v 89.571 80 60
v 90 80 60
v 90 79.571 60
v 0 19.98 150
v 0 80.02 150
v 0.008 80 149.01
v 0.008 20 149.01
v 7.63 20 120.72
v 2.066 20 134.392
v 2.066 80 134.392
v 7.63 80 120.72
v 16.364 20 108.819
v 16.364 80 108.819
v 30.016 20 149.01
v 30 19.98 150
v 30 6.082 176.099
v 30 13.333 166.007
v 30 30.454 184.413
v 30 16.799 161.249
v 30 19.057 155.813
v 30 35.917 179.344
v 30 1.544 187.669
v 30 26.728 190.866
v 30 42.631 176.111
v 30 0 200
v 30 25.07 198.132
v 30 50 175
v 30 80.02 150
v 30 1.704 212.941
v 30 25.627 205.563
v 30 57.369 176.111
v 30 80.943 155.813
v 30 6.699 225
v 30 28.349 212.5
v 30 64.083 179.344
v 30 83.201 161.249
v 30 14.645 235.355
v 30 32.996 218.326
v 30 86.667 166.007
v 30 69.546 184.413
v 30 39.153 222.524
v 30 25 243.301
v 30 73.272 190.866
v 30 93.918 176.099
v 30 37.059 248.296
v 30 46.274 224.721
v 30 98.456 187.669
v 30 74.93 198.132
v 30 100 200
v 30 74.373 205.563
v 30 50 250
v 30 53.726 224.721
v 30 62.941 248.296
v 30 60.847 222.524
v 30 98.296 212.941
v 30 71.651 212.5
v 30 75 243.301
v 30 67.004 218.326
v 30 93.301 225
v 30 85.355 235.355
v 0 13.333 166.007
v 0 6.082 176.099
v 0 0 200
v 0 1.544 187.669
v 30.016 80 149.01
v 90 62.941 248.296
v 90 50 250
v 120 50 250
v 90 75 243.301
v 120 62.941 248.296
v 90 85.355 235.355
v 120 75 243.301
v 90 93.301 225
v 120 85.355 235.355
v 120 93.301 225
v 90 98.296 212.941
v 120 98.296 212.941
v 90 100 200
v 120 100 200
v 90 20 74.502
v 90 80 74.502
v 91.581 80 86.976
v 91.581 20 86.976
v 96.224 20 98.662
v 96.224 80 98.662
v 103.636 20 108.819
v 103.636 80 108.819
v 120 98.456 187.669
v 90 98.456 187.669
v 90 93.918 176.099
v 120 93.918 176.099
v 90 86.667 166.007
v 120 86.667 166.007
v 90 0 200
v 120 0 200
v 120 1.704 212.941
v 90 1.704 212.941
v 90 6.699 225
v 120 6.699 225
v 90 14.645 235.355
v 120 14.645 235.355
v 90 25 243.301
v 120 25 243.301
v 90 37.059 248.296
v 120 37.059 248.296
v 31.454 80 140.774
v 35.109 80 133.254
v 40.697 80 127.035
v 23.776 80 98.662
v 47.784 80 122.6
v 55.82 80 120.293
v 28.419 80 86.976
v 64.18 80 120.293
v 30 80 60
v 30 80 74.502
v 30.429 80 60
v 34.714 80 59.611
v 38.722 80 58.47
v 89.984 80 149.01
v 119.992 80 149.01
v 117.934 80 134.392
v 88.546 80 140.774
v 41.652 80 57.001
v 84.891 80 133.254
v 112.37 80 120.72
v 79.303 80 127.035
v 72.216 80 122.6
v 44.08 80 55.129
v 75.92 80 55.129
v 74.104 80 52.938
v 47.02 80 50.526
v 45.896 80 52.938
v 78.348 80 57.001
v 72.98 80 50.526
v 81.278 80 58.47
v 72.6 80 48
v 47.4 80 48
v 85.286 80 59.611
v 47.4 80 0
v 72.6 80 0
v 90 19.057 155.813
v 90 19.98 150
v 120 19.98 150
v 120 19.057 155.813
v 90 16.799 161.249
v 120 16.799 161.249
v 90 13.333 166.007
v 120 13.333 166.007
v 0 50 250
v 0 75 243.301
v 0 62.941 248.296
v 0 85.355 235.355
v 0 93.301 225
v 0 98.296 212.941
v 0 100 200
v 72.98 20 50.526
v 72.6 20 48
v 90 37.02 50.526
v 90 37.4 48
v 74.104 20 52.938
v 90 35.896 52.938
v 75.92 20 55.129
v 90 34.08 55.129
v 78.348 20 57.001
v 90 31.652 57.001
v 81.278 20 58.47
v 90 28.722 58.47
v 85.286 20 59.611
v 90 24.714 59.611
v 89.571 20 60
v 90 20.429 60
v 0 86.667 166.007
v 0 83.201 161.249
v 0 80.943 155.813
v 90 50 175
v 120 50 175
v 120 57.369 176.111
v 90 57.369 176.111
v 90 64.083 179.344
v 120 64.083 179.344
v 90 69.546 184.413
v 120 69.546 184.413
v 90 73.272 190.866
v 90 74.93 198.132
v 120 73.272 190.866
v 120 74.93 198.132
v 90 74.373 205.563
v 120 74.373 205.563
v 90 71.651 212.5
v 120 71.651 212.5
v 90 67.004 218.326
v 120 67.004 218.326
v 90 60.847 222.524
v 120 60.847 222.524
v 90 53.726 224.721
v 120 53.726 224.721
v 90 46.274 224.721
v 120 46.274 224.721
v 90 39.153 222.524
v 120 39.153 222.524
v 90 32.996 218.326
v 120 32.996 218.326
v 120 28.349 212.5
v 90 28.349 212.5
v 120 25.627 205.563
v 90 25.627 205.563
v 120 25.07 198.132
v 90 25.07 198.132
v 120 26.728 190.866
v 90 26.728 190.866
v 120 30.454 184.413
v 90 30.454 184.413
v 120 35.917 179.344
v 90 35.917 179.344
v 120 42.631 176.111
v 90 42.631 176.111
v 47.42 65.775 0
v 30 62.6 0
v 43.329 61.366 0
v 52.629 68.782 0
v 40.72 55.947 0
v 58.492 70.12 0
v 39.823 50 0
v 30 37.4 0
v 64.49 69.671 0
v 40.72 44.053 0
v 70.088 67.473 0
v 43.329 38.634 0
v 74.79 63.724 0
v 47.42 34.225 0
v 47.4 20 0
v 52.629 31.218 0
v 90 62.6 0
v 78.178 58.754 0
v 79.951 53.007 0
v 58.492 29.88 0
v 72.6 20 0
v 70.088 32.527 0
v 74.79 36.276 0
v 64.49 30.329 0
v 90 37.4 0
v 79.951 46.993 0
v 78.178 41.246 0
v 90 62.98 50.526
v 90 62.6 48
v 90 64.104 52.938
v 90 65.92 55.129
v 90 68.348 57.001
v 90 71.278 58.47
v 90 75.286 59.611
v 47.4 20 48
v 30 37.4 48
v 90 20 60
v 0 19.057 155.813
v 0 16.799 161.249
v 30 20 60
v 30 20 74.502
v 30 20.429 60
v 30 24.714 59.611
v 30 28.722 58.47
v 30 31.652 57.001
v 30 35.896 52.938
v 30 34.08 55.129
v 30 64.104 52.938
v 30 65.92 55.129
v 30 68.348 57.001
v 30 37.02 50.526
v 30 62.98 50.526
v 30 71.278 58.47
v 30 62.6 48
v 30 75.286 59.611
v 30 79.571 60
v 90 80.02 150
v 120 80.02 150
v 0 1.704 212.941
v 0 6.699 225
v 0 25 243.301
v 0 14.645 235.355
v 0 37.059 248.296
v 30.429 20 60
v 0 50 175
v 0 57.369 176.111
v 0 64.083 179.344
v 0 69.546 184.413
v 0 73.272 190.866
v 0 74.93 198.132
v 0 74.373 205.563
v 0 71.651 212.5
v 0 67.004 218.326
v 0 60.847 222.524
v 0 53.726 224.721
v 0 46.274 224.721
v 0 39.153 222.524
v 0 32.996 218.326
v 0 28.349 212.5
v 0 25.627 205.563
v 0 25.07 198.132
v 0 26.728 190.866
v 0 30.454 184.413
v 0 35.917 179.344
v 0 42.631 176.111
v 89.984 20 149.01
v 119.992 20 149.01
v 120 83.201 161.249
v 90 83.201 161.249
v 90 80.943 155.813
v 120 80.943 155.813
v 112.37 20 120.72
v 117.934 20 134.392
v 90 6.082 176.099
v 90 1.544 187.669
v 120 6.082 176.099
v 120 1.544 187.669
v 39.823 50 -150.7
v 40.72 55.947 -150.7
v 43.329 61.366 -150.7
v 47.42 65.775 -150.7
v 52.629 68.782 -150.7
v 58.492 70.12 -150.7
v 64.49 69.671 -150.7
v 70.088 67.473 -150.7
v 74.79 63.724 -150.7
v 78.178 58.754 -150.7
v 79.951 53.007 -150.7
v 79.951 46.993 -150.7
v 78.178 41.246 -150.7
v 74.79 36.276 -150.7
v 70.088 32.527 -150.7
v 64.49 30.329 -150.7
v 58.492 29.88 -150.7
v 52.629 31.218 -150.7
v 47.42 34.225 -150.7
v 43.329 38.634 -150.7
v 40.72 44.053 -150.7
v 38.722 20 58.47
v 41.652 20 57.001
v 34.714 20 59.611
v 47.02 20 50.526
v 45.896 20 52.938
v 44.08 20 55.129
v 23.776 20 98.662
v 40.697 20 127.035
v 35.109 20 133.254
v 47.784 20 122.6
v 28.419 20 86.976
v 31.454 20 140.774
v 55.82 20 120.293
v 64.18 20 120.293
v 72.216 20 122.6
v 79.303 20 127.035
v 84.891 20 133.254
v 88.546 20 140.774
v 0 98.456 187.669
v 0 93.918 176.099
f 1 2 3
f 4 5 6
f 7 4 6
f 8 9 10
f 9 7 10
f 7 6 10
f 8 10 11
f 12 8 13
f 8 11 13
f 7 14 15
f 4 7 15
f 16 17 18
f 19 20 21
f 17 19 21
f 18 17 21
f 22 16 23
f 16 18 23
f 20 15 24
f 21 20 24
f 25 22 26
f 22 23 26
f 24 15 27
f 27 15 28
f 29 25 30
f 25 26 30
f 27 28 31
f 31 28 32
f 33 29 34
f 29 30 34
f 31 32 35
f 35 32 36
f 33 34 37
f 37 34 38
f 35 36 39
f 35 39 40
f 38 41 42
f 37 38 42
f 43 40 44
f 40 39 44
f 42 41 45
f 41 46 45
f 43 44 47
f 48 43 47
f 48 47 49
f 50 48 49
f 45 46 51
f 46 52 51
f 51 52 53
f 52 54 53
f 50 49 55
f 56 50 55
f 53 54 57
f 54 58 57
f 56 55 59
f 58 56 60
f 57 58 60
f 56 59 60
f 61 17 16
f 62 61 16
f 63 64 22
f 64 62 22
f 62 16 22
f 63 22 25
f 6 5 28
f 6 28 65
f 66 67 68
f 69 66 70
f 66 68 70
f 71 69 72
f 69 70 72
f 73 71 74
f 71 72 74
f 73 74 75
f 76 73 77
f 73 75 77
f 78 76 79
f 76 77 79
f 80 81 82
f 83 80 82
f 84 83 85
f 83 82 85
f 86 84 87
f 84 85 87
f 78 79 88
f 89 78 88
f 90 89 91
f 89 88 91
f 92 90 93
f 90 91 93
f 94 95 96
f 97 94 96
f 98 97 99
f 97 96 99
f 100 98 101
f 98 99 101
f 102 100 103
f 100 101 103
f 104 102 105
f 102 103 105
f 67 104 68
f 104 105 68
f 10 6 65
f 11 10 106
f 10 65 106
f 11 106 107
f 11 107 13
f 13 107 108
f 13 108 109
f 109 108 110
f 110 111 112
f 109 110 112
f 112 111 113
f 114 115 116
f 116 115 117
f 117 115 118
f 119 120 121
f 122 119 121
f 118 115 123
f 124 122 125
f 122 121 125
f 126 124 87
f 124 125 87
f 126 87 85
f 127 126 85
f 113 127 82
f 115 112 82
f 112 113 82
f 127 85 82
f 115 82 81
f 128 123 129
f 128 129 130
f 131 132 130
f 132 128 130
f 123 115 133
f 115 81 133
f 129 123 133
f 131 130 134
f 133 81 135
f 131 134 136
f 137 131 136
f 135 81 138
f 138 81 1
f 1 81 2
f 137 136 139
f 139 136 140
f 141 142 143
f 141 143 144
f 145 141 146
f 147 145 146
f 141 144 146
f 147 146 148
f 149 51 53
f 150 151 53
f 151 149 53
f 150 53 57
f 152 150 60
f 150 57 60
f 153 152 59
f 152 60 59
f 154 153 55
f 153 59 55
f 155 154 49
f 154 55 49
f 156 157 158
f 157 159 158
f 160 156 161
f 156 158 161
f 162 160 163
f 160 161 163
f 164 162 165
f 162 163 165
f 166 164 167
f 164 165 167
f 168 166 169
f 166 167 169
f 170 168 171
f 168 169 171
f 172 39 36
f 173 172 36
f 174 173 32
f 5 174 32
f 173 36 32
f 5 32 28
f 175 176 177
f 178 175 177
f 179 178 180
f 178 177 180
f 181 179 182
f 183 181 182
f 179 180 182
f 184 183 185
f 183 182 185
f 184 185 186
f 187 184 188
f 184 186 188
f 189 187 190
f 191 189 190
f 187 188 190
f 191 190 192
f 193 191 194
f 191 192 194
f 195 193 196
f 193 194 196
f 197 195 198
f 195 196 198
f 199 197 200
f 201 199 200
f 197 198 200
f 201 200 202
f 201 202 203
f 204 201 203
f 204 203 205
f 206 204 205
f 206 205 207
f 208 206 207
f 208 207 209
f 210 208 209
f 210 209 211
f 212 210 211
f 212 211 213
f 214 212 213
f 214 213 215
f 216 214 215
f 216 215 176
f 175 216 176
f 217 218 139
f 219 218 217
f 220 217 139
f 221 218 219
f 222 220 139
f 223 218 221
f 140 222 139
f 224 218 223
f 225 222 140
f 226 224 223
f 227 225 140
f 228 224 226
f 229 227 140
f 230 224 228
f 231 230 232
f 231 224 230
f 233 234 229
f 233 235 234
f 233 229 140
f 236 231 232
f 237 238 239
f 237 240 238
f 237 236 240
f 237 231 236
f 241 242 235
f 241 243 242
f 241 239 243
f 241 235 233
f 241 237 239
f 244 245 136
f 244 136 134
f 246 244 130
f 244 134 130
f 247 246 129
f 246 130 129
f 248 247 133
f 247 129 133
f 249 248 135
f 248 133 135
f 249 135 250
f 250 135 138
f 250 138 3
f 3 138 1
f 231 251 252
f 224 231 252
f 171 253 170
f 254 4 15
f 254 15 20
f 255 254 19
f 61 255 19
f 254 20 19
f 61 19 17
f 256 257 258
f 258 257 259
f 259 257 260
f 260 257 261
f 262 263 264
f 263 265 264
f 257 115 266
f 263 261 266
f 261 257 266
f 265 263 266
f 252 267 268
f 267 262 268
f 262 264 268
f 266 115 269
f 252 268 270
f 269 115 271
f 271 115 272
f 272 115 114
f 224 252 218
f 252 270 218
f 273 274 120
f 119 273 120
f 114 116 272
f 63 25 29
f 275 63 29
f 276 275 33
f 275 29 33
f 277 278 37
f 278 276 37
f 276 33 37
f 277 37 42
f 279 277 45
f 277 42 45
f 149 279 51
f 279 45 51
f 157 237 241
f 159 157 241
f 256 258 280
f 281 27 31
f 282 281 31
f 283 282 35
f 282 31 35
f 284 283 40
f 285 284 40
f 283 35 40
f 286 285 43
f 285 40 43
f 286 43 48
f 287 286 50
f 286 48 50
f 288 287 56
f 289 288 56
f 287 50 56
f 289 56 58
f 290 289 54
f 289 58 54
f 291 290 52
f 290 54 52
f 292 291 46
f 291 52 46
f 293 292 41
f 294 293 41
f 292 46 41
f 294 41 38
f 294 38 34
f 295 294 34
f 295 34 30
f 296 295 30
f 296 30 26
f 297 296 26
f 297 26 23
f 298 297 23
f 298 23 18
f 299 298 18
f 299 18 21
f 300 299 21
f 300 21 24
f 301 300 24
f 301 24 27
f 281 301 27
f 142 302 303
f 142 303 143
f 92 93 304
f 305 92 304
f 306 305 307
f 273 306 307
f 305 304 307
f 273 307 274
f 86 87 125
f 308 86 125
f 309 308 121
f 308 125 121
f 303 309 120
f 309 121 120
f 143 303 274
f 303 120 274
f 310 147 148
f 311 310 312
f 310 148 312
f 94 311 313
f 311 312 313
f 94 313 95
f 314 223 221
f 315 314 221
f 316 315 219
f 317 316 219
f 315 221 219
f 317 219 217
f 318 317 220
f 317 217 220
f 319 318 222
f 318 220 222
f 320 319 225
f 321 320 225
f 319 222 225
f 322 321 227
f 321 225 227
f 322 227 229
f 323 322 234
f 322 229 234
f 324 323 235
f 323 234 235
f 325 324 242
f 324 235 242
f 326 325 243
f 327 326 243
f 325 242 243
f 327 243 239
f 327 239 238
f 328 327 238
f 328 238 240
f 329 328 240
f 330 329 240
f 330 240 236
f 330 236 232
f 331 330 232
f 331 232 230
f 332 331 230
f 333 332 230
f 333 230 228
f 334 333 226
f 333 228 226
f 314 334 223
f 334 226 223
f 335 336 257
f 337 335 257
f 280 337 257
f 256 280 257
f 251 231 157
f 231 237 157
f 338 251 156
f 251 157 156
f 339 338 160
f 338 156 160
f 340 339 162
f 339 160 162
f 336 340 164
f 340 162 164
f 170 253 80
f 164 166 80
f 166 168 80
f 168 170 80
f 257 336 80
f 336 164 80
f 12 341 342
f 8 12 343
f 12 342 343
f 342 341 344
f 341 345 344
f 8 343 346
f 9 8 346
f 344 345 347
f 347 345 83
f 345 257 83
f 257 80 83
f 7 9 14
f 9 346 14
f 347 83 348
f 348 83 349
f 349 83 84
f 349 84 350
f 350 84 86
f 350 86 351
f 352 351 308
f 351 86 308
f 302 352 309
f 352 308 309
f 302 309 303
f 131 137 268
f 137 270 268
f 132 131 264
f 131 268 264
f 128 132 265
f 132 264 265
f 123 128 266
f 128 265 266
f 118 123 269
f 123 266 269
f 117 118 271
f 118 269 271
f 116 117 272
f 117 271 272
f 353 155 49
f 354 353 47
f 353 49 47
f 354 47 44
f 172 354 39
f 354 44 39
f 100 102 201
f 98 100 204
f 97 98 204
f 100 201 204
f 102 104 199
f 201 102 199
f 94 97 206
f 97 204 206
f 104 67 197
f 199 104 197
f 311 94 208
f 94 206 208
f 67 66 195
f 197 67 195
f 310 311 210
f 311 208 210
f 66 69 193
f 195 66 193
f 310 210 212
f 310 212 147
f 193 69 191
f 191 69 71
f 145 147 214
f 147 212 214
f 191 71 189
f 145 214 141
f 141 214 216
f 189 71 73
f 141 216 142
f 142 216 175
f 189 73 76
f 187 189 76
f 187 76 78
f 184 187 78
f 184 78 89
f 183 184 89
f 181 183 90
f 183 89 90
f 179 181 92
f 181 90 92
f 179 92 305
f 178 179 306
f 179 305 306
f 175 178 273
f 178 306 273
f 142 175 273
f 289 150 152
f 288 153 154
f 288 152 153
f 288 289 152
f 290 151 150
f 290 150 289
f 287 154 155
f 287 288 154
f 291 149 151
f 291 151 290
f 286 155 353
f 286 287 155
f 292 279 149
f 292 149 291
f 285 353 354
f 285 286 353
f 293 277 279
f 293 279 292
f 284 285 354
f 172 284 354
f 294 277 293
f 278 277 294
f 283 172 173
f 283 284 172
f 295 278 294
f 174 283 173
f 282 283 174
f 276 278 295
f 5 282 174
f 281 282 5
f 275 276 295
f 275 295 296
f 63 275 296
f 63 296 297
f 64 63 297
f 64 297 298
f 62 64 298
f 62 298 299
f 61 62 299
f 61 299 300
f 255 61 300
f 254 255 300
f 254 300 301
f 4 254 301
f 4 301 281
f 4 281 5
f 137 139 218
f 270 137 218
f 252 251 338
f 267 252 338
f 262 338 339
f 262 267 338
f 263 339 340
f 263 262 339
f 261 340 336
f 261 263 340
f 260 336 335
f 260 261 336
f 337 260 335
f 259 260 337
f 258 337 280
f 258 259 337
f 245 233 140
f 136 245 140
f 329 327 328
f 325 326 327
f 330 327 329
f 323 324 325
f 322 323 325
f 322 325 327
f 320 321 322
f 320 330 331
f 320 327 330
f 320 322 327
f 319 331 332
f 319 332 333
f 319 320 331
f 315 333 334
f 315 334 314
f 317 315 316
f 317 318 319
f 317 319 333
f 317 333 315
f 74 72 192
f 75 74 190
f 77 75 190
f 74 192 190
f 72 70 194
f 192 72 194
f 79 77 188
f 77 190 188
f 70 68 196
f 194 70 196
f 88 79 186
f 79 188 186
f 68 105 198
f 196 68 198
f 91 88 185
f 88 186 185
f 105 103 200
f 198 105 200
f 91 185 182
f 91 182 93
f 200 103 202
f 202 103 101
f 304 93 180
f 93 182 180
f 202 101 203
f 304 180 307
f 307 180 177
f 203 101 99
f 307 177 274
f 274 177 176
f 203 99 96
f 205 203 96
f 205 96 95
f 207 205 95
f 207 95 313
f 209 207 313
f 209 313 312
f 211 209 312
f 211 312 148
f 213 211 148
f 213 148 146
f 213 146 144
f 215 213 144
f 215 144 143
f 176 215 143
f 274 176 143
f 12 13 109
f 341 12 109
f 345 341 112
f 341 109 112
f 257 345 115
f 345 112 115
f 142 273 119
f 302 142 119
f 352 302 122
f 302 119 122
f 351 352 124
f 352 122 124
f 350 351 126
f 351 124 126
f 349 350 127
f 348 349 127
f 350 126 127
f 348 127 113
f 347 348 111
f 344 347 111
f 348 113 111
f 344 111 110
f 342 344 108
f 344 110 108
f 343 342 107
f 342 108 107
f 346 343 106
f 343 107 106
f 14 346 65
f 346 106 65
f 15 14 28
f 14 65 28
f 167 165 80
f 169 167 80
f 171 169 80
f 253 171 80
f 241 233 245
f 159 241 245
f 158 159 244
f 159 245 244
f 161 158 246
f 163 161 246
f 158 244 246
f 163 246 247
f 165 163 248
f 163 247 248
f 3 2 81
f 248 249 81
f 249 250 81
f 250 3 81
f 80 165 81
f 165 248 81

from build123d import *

# Parameters (mm, degrees)
SKETCH1_W           = 120
SKETCH1_H           = 250
BOSS_EXTRUDE1_DEPTH = 100
CUT_EXTRUDE1_DEPTH  = 295.78805946
CUT_EXTRUDE2_DEPTH  = 295.78805946
SKETCH5_R           = 25
CUT_EXTRUDE3_DEPTH  = 295.7880595
CUT_EXTRUDE5_DEPTH  = 60
CUT_EXTRUDE6_DEPTH  = 60
CUT_EXTRUDE7_DEPTH  = 60
CUT_EXTRUDE8_DEPTH  = 60
SKETCH10_R          = 20.176522507
BOSS_EXTRUDE2_DEPTH = 150.7
FILLET1_R           = 12
FILLET2_R           = 12
FILLET3_R           = 12
FILLET4_R           = 12


with BuildPart() as part:
    # Sketch1 → Boss-Extrude1 (new body)
    with BuildSketch(Plane(origin=(0, 0, 0), x_dir=(1, 0, 0), z_dir=(0, 1, 0))):
        with Locations((60, -125)):
            Rectangle(SKETCH1_W, SKETCH1_H)
    extrude(amount=BOSS_EXTRUDE1_DEPTH)

    # Sketch2 → Cut-Extrude1 (cut, through all)
    with BuildSketch(Plane(origin=(0, 100, 0), x_dir=(1, 0, 0), z_dir=(0, 1, 0))):
        with BuildLine():
            ThreePointArc((90, -150), (60, -120), (30, -150))
            Line((30, -150), (30, -250))
            Line((30, -250), (90, -250))
            Line((90, -250), (90, -150))
        make_face()
        with BuildLine():
            Line((120, 0), (90, 0))
            Line((90, 0), (90, -74.501655647))
            ThreePointArc((90, -74.501655647), (93.533981136, -92.965379294), (103.636363636, -108.819084899))
            ThreePointArc((103.636363636, -108.819084899), (115.759222637, -127.843531624), (120, -150))
            Line((120, -150), (120, 0))
        make_face()
        with BuildLine():
            Line((30, -74.501655647), (30, 0))
            Line((30, 0), (0, 0))
            Line((0, 0), (0, -150.000000078))
            ThreePointArc((0, -150.000000078), (4.240777349, -127.84353166), (16.363636364, -108.819084899))
            ThreePointArc((16.363636364, -108.819084899), (26.466018864, -92.965379294), (30, -74.501655647))
        make_face()
    extrude(amount=-CUT_EXTRUDE1_DEPTH, mode=Mode.SUBTRACT)

    # Sketch4 → Cut-Extrude2 (cut, through all)
    with BuildSketch(Plane(origin=(120, 0, 0), x_dir=(0, 0, -1), z_dir=(1, 0, 0))):
        with BuildLine():
            ThreePointArc((-250, 50), (-235.355339059, 85.355339059), (-200, 100))
            Line((-200, 100), (-250, 100))
            Line((-250, 100), (-250, 50))
        make_face()
        with BuildLine():
            Line((-150, 100), (-200, 100))
            ThreePointArc((-200, 100), (-181.742581416, 96.547466813), (-166.006536576, 86.666666667))
            ThreePointArc((-166.006536576, 86.666666667), (-158.59772436, 81.911652295), (-150, 80.019617425))
            Line((-150, 80.019617425), (-150, 100))
        make_face()
        with BuildLine():
            Line((-108.819084899, 100), (-150, 100))
            Line((-150, 100), (-150, 80.019617425))
            ThreePointArc((-150, 80.019617425), (-149.504999586, 80.004904837), (-149.009804864, 80))
            Line((-149.009804864, 80), (0, 80))
            Line((0, 80), (0, 100))
            Line((0, 100), (-74.501655647, 100))
            Line((-74.501655647, 100), (-108.819084899, 100))
        make_face()
        with BuildLine():
            ThreePointArc((-200, 0), (-235.355339059, 14.644660941), (-250, 50))
            Line((-250, 50), (-250, 0))
            Line((-250, 0), (-200, 0))
        make_face()
        with BuildLine():
            ThreePointArc((-166.006536576, 13.333333333), (-181.742581416, 3.452533187), (-200, 0))
            Line((-200, 0), (-150, 0))
            Line((-150, 0), (-150, 19.980382575))
            ThreePointArc((-150, 19.980382575), (-158.59772436, 18.088347705), (-166.006536576, 13.333333333))
        make_face()
        with BuildLine():
            ThreePointArc((-149.009804864, 20), (-149.504999586, 19.995095163), (-150, 19.980382575))
            Line((-150, 19.980382575), (-150, 0))
            Line((-150, 0), (-108.819084899, 0))
            Line((-108.819084899, 0), (-74.501655647, 0))
            Line((-74.501655647, 0), (0, 0))
            Line((0, 0), (0, 20))
            Line((0, 20), (-149.009804864, 20))
        make_face()
    extrude(amount=-CUT_EXTRUDE2_DEPTH, mode=Mode.SUBTRACT)

    # Sketch5 → Cut-Extrude3 (cut, through all)
    with BuildSketch(Plane(origin=(120, 0, 0), x_dir=(0, 0, -1), z_dir=(1, 0, 0))):
        with Locations((-200, 50)):
            Circle(SKETCH5_R)
    extrude(amount=-CUT_EXTRUDE3_DEPTH, mode=Mode.SUBTRACT)

    # Sketch6 → Cut-Extrude5 (cut)
    with BuildSketch(Plane(origin=(0, 0, 0), x_dir=(-1, 0, 0), z_dir=(0, 0, -1))):
        Polygon((-30, 62.6), (-30, 80), (-47.4, 80), align=None)
    extrude(amount=-CUT_EXTRUDE5_DEPTH, mode=Mode.SUBTRACT)

    # Sketch7 → Cut-Extrude6 (cut)
    with BuildSketch(Plane(origin=(0, 0, 0), x_dir=(-1, 0, 0), z_dir=(0, 0, -1))):
        Polygon((-72.6, 80), (-90, 80), (-90, 62.6), align=None)
    extrude(amount=-CUT_EXTRUDE6_DEPTH, mode=Mode.SUBTRACT)

    # Sketch8 → Cut-Extrude7 (cut)
    with BuildSketch(Plane(origin=(0, 0, 0), x_dir=(-1, 0, 0), z_dir=(0, 0, -1))):
        Polygon((-90, 37.4), (-90, 20), (-72.6, 20), align=None)
    extrude(amount=-CUT_EXTRUDE7_DEPTH, mode=Mode.SUBTRACT)

    # Sketch9 → Cut-Extrude8 (cut)
    with BuildSketch(Plane(origin=(0, 0, 0), x_dir=(-1, 0, 0), z_dir=(0, 0, -1))):
        Polygon((-30, 37.4), (-30, 20), (-47.4, 20), align=None)
    extrude(amount=-CUT_EXTRUDE8_DEPTH, mode=Mode.SUBTRACT)

    # Sketch10 → Boss-Extrude2 (add)
    with BuildSketch(Plane(origin=(0, 0, 0), x_dir=(-1, 0, 0), z_dir=(0, 0, -1))):
        with Locations((-60, 50)):
            Circle(SKETCH10_R)
    extrude(amount=BOSS_EXTRUDE2_DEPTH)

    # Fillet1
    fillet1_edges = [part.edges().sort_by_distance(p)[0] for p in [
        (81.3, 28.7, 60),
    ]]
    fillet(fillet1_edges, radius=FILLET1_R)

    # Fillet2
    fillet2_edges = [part.edges().sort_by_distance(p)[0] for p in [
        (81.3, 71.3, 60),
    ]]
    fillet(fillet2_edges, radius=FILLET2_R)

    # Fillet3
    fillet3_edges = [part.edges().sort_by_distance(p)[0] for p in [
        (38.7, 71.3, 60),
    ]]
    fillet(fillet3_edges, radius=FILLET3_R)

    # Fillet4
    fillet4_edges = [part.edges().sort_by_distance(p)[0] for p in [
        (38.7, 28.7, 60),
    ]]
    fillet(fillet4_edges, radius=FILLET4_R)


solid = part.part
